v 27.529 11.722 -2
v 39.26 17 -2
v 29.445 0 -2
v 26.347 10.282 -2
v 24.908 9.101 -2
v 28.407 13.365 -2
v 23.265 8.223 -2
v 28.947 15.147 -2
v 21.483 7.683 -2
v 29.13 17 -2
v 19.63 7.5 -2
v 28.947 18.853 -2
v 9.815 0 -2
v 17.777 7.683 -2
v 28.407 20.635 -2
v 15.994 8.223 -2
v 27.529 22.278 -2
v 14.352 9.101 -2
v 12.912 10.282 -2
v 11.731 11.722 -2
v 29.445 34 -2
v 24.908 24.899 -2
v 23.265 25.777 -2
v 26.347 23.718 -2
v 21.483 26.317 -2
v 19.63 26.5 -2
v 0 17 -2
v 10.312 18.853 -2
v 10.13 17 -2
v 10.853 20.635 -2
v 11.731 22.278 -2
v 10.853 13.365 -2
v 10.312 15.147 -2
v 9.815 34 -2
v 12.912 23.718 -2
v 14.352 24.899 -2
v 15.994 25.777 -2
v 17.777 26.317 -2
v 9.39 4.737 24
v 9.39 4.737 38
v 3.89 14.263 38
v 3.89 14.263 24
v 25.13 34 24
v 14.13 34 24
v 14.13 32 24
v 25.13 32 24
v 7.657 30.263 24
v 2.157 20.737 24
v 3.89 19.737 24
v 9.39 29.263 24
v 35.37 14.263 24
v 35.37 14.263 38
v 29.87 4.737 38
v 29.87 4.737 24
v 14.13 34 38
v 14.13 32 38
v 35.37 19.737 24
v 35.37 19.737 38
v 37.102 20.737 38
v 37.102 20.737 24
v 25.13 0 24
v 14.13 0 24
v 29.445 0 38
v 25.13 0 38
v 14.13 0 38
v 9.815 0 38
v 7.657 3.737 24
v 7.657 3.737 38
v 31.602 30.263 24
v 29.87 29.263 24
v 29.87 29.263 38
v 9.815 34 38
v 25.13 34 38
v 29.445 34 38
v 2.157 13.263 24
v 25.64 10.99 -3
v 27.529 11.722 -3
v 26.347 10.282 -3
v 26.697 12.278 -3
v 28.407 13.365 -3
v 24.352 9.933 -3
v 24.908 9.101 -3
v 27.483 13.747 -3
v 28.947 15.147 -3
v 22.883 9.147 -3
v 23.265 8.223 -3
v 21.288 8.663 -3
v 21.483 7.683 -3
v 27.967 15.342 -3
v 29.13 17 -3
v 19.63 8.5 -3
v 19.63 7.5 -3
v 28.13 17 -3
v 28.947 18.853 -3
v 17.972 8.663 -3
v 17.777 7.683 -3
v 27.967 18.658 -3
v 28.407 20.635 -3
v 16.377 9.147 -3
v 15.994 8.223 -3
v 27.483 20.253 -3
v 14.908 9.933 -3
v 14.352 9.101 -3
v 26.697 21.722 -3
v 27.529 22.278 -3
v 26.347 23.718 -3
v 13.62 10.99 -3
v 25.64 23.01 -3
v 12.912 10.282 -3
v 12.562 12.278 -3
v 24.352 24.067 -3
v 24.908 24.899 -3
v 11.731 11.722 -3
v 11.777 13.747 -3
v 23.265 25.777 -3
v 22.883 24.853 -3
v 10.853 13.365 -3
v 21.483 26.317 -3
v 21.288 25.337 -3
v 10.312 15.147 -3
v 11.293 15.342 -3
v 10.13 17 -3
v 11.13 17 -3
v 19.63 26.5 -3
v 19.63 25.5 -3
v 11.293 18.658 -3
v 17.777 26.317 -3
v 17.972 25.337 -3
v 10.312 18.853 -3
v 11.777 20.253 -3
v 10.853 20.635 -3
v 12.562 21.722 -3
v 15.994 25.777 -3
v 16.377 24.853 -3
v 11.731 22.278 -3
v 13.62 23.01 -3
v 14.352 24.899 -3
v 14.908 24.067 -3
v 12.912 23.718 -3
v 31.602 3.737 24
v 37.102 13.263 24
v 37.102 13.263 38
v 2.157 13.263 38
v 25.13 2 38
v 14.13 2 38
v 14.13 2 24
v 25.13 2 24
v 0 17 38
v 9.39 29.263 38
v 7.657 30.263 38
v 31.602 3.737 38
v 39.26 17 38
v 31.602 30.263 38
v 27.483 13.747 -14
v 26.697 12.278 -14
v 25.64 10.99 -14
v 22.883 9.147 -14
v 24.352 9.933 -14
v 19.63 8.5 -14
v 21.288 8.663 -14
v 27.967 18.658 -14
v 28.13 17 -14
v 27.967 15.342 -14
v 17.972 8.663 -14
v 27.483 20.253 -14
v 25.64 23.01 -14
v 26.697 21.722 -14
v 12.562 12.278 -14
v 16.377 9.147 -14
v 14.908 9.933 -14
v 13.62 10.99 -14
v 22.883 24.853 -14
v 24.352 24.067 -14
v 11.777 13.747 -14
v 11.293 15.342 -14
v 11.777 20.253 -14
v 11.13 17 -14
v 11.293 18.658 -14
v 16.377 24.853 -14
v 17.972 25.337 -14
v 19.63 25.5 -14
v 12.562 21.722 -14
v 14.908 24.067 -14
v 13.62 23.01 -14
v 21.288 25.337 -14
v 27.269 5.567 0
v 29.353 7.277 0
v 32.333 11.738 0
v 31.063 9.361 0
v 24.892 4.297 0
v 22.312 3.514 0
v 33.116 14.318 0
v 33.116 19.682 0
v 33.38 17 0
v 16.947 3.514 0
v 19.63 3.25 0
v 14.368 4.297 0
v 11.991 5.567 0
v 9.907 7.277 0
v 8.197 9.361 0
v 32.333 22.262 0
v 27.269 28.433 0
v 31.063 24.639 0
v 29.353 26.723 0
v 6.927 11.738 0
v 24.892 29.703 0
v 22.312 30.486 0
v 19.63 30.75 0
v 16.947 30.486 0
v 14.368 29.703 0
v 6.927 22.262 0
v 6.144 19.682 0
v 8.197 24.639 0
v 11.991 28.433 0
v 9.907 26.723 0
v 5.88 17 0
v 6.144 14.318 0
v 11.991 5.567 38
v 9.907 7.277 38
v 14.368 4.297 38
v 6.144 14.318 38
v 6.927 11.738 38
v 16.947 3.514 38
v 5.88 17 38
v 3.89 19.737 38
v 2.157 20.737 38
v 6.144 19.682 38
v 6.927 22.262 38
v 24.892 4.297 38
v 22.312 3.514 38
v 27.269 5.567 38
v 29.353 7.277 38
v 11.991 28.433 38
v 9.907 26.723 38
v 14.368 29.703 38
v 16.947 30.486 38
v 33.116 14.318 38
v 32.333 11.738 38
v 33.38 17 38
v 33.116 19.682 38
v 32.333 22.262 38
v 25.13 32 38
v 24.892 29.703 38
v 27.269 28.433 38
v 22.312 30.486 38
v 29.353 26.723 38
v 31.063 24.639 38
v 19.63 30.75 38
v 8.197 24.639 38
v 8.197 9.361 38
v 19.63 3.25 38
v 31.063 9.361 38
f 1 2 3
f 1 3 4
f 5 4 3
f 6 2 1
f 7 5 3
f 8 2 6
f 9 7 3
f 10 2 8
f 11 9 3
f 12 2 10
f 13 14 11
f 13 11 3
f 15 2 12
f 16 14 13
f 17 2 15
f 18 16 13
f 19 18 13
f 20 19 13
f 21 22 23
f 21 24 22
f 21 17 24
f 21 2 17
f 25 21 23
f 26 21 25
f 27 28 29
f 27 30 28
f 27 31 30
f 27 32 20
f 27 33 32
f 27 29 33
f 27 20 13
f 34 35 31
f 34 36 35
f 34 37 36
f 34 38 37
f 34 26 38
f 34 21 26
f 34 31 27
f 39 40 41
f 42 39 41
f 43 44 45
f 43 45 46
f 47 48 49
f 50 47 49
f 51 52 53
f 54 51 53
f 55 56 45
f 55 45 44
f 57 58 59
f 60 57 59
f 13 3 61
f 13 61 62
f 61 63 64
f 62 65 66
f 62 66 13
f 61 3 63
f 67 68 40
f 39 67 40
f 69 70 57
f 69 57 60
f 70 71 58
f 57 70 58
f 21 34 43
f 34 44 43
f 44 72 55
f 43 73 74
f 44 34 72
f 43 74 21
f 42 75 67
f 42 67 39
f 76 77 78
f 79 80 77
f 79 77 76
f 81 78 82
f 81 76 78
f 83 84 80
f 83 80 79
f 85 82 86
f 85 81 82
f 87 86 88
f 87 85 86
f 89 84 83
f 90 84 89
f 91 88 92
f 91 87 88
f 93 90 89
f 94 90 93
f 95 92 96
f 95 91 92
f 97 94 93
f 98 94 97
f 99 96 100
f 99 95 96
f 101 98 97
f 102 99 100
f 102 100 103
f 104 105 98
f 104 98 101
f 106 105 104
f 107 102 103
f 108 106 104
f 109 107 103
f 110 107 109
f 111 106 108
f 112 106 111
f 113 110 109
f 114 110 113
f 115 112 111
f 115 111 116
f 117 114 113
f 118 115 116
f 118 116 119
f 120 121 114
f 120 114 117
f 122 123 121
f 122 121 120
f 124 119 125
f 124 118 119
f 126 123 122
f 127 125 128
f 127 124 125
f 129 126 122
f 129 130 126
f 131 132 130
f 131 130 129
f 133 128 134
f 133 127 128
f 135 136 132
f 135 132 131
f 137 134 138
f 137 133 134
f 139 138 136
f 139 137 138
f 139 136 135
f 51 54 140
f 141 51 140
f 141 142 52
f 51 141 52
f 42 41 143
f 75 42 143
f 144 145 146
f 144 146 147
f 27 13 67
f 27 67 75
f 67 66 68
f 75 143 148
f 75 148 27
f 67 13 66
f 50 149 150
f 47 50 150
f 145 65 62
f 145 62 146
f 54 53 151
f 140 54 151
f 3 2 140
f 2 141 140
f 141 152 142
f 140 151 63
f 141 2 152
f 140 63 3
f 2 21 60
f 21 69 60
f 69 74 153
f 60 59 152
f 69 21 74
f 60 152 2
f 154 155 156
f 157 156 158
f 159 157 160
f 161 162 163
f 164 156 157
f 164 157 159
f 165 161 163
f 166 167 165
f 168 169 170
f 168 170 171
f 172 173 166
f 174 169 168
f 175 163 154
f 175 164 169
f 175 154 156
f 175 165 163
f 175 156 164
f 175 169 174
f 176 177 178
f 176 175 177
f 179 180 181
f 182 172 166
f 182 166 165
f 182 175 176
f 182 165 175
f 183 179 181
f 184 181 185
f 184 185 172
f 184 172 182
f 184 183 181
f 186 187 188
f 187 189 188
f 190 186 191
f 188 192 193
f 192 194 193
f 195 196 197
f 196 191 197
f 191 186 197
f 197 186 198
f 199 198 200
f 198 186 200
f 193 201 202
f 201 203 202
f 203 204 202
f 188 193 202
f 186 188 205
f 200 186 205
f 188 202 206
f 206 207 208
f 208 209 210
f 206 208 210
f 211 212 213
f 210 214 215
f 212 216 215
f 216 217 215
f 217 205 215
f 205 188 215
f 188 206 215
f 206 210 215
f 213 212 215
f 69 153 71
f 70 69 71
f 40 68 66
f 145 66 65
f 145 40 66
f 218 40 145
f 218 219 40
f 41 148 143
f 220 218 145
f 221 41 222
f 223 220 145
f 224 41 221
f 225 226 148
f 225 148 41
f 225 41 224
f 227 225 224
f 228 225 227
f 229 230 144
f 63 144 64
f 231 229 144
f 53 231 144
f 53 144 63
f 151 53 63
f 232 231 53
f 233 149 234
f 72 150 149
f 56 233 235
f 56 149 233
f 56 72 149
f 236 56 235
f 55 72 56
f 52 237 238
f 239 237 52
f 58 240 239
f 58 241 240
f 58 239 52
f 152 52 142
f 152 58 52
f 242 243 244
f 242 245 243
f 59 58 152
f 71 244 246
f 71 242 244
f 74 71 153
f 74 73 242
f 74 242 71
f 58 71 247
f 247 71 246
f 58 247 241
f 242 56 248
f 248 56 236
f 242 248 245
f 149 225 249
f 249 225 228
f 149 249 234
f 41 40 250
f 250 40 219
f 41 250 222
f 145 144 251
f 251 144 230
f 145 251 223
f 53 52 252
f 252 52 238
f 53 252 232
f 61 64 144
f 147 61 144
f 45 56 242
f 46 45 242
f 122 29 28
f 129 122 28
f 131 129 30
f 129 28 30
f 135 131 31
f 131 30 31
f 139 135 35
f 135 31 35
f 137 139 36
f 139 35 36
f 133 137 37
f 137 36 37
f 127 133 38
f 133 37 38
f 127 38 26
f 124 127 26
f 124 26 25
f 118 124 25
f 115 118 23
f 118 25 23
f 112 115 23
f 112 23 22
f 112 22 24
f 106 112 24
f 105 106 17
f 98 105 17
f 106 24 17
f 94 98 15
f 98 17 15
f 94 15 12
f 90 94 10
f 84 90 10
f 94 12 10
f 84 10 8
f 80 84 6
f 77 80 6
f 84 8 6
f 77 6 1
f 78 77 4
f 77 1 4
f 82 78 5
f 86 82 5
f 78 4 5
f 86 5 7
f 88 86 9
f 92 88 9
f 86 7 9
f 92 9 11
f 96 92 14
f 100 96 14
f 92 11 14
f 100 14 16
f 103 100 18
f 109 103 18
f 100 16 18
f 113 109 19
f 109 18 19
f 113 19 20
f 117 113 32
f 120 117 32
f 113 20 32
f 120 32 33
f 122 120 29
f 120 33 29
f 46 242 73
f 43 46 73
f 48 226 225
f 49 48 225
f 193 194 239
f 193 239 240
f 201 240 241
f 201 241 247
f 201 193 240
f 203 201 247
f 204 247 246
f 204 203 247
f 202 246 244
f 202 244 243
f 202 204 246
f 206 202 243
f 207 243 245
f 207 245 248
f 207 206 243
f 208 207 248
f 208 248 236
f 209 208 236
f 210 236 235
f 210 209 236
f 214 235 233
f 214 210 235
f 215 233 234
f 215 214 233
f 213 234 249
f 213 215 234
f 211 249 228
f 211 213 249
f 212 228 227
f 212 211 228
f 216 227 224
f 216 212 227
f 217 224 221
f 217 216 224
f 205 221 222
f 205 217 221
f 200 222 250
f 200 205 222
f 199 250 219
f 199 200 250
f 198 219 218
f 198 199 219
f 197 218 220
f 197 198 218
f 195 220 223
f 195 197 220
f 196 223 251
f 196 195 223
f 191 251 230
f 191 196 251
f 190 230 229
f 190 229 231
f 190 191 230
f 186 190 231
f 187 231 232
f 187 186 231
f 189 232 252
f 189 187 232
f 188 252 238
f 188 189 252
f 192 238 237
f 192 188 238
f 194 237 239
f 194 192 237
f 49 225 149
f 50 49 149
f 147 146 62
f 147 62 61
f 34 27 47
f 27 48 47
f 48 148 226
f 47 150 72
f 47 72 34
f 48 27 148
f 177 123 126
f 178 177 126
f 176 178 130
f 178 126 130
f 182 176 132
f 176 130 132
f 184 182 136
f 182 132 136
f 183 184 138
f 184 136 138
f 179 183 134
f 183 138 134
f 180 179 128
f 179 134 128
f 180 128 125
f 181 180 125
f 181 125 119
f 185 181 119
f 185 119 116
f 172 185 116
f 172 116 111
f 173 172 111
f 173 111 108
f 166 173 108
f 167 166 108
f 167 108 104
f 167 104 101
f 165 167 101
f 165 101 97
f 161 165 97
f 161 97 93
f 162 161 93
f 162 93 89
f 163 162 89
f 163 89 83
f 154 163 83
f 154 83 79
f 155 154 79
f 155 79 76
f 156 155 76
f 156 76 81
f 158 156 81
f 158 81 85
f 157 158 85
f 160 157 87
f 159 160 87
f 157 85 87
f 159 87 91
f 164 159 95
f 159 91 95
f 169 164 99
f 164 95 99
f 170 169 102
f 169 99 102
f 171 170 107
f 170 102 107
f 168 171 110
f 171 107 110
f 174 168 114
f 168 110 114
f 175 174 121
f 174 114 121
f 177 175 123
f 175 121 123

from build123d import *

# Parameters (mm, degrees)
ESQUISSE1_R             = 13.75
BOSS_EXTRU_1_DEPTH      = 38
ESQUISSE2_W             = 11
ESQUISSE2_H             = 2
ENL_V_MAT_EXTRU_1_DEPTH = 14
BOSS_EXTRU_2_DEPTH      = 2
ESQUISSE5_R             = 8.5
BOSS_EXTRU_3_DEPTH      = 12
ESQUISSE6_R             = 9.5
BOSS_EXTRU_4_DEPTH      = 1


with BuildPart() as part:
    # Esquisse1 → Boss.-Extru.1 (new body)
    with BuildSketch(Plane.XY):
        Polygon((39.259818305, 17), (29.444863729, 34), (9.814954576, 34), (0, 17), (9.814954576, 0), (29.444863729, 0), align=None)
        with Locations((19.629909152, 17)):
            Circle(ESQUISSE1_R, mode=Mode.SUBTRACT)
    extrude(amount=BOSS_EXTRU_1_DEPTH)

    # Esquisse2 → Enlèv. mat.-Extru.1 (cut)
    with BuildSketch(Plane.XY.offset(38)):
        with Locations((19.629909152, 1)):
            Rectangle(ESQUISSE2_W, ESQUISSE2_H)
        Polygon((2.157477288, 13.263139721), (7.657477288, 3.736860279), (9.389528096, 4.736860279), (3.889528096, 14.263139721), align=None)
        Polygon((7.657477288, 30.263139721), (2.157477288, 20.736860279), (3.889528096, 19.736860279), (9.389528096, 29.263139721), align=None)
        with Locations((19.629909152, 33)):
            Rectangle(ESQUISSE2_W, ESQUISSE2_H)
        Polygon((37.102341017, 20.736860279), (31.602341017, 30.263139721), (29.870290209, 29.263139721), (35.370290209, 19.736860279), align=None)
        Polygon((31.602341017, 3.736860279), (37.102341017, 13.263139721), (35.370290209, 14.263139721), (29.870290209, 4.736860279), align=None)
    extrude(amount=-ENL_V_MAT_EXTRU_1_DEPTH, mode=Mode.SUBTRACT)

    # Esquisse4 → Boss.-Extru.2 (add)
    with BuildSketch(Plane(origin=(0, 0, 0), x_dir=(-1, 0, 0), z_dir=(0, 0, -1))):
        Polygon((-39.259818305, 17), (-29.444863729, 0), (-9.814954576, 0), (0, 17), (-9.814954576, 34), (-29.444863729, 34), align=None)
    extrude(amount=BOSS_EXTRU_2_DEPTH)

    # Esquisse5 → Boss.-Extru.3 (add)
    with BuildSketch(Plane(origin=(0, 0, -2), x_dir=(-1, 0, 0), z_dir=(0, 0, -1))):
        with Locations((-19.629909152, 17)):
            Circle(ESQUISSE5_R)
    extrude(amount=BOSS_EXTRU_3_DEPTH)

    # Esquisse6 → Boss.-Extru.4 (add)
    with BuildSketch(Plane(origin=(0, 0, -2), x_dir=(-1, 0, 0), z_dir=(0, 0, -1))):
        with Locations((-19.629909152, 17)):
            Circle(ESQUISSE6_R)
    extrude(amount=BOSS_EXTRU_4_DEPTH)


solid = part.part
